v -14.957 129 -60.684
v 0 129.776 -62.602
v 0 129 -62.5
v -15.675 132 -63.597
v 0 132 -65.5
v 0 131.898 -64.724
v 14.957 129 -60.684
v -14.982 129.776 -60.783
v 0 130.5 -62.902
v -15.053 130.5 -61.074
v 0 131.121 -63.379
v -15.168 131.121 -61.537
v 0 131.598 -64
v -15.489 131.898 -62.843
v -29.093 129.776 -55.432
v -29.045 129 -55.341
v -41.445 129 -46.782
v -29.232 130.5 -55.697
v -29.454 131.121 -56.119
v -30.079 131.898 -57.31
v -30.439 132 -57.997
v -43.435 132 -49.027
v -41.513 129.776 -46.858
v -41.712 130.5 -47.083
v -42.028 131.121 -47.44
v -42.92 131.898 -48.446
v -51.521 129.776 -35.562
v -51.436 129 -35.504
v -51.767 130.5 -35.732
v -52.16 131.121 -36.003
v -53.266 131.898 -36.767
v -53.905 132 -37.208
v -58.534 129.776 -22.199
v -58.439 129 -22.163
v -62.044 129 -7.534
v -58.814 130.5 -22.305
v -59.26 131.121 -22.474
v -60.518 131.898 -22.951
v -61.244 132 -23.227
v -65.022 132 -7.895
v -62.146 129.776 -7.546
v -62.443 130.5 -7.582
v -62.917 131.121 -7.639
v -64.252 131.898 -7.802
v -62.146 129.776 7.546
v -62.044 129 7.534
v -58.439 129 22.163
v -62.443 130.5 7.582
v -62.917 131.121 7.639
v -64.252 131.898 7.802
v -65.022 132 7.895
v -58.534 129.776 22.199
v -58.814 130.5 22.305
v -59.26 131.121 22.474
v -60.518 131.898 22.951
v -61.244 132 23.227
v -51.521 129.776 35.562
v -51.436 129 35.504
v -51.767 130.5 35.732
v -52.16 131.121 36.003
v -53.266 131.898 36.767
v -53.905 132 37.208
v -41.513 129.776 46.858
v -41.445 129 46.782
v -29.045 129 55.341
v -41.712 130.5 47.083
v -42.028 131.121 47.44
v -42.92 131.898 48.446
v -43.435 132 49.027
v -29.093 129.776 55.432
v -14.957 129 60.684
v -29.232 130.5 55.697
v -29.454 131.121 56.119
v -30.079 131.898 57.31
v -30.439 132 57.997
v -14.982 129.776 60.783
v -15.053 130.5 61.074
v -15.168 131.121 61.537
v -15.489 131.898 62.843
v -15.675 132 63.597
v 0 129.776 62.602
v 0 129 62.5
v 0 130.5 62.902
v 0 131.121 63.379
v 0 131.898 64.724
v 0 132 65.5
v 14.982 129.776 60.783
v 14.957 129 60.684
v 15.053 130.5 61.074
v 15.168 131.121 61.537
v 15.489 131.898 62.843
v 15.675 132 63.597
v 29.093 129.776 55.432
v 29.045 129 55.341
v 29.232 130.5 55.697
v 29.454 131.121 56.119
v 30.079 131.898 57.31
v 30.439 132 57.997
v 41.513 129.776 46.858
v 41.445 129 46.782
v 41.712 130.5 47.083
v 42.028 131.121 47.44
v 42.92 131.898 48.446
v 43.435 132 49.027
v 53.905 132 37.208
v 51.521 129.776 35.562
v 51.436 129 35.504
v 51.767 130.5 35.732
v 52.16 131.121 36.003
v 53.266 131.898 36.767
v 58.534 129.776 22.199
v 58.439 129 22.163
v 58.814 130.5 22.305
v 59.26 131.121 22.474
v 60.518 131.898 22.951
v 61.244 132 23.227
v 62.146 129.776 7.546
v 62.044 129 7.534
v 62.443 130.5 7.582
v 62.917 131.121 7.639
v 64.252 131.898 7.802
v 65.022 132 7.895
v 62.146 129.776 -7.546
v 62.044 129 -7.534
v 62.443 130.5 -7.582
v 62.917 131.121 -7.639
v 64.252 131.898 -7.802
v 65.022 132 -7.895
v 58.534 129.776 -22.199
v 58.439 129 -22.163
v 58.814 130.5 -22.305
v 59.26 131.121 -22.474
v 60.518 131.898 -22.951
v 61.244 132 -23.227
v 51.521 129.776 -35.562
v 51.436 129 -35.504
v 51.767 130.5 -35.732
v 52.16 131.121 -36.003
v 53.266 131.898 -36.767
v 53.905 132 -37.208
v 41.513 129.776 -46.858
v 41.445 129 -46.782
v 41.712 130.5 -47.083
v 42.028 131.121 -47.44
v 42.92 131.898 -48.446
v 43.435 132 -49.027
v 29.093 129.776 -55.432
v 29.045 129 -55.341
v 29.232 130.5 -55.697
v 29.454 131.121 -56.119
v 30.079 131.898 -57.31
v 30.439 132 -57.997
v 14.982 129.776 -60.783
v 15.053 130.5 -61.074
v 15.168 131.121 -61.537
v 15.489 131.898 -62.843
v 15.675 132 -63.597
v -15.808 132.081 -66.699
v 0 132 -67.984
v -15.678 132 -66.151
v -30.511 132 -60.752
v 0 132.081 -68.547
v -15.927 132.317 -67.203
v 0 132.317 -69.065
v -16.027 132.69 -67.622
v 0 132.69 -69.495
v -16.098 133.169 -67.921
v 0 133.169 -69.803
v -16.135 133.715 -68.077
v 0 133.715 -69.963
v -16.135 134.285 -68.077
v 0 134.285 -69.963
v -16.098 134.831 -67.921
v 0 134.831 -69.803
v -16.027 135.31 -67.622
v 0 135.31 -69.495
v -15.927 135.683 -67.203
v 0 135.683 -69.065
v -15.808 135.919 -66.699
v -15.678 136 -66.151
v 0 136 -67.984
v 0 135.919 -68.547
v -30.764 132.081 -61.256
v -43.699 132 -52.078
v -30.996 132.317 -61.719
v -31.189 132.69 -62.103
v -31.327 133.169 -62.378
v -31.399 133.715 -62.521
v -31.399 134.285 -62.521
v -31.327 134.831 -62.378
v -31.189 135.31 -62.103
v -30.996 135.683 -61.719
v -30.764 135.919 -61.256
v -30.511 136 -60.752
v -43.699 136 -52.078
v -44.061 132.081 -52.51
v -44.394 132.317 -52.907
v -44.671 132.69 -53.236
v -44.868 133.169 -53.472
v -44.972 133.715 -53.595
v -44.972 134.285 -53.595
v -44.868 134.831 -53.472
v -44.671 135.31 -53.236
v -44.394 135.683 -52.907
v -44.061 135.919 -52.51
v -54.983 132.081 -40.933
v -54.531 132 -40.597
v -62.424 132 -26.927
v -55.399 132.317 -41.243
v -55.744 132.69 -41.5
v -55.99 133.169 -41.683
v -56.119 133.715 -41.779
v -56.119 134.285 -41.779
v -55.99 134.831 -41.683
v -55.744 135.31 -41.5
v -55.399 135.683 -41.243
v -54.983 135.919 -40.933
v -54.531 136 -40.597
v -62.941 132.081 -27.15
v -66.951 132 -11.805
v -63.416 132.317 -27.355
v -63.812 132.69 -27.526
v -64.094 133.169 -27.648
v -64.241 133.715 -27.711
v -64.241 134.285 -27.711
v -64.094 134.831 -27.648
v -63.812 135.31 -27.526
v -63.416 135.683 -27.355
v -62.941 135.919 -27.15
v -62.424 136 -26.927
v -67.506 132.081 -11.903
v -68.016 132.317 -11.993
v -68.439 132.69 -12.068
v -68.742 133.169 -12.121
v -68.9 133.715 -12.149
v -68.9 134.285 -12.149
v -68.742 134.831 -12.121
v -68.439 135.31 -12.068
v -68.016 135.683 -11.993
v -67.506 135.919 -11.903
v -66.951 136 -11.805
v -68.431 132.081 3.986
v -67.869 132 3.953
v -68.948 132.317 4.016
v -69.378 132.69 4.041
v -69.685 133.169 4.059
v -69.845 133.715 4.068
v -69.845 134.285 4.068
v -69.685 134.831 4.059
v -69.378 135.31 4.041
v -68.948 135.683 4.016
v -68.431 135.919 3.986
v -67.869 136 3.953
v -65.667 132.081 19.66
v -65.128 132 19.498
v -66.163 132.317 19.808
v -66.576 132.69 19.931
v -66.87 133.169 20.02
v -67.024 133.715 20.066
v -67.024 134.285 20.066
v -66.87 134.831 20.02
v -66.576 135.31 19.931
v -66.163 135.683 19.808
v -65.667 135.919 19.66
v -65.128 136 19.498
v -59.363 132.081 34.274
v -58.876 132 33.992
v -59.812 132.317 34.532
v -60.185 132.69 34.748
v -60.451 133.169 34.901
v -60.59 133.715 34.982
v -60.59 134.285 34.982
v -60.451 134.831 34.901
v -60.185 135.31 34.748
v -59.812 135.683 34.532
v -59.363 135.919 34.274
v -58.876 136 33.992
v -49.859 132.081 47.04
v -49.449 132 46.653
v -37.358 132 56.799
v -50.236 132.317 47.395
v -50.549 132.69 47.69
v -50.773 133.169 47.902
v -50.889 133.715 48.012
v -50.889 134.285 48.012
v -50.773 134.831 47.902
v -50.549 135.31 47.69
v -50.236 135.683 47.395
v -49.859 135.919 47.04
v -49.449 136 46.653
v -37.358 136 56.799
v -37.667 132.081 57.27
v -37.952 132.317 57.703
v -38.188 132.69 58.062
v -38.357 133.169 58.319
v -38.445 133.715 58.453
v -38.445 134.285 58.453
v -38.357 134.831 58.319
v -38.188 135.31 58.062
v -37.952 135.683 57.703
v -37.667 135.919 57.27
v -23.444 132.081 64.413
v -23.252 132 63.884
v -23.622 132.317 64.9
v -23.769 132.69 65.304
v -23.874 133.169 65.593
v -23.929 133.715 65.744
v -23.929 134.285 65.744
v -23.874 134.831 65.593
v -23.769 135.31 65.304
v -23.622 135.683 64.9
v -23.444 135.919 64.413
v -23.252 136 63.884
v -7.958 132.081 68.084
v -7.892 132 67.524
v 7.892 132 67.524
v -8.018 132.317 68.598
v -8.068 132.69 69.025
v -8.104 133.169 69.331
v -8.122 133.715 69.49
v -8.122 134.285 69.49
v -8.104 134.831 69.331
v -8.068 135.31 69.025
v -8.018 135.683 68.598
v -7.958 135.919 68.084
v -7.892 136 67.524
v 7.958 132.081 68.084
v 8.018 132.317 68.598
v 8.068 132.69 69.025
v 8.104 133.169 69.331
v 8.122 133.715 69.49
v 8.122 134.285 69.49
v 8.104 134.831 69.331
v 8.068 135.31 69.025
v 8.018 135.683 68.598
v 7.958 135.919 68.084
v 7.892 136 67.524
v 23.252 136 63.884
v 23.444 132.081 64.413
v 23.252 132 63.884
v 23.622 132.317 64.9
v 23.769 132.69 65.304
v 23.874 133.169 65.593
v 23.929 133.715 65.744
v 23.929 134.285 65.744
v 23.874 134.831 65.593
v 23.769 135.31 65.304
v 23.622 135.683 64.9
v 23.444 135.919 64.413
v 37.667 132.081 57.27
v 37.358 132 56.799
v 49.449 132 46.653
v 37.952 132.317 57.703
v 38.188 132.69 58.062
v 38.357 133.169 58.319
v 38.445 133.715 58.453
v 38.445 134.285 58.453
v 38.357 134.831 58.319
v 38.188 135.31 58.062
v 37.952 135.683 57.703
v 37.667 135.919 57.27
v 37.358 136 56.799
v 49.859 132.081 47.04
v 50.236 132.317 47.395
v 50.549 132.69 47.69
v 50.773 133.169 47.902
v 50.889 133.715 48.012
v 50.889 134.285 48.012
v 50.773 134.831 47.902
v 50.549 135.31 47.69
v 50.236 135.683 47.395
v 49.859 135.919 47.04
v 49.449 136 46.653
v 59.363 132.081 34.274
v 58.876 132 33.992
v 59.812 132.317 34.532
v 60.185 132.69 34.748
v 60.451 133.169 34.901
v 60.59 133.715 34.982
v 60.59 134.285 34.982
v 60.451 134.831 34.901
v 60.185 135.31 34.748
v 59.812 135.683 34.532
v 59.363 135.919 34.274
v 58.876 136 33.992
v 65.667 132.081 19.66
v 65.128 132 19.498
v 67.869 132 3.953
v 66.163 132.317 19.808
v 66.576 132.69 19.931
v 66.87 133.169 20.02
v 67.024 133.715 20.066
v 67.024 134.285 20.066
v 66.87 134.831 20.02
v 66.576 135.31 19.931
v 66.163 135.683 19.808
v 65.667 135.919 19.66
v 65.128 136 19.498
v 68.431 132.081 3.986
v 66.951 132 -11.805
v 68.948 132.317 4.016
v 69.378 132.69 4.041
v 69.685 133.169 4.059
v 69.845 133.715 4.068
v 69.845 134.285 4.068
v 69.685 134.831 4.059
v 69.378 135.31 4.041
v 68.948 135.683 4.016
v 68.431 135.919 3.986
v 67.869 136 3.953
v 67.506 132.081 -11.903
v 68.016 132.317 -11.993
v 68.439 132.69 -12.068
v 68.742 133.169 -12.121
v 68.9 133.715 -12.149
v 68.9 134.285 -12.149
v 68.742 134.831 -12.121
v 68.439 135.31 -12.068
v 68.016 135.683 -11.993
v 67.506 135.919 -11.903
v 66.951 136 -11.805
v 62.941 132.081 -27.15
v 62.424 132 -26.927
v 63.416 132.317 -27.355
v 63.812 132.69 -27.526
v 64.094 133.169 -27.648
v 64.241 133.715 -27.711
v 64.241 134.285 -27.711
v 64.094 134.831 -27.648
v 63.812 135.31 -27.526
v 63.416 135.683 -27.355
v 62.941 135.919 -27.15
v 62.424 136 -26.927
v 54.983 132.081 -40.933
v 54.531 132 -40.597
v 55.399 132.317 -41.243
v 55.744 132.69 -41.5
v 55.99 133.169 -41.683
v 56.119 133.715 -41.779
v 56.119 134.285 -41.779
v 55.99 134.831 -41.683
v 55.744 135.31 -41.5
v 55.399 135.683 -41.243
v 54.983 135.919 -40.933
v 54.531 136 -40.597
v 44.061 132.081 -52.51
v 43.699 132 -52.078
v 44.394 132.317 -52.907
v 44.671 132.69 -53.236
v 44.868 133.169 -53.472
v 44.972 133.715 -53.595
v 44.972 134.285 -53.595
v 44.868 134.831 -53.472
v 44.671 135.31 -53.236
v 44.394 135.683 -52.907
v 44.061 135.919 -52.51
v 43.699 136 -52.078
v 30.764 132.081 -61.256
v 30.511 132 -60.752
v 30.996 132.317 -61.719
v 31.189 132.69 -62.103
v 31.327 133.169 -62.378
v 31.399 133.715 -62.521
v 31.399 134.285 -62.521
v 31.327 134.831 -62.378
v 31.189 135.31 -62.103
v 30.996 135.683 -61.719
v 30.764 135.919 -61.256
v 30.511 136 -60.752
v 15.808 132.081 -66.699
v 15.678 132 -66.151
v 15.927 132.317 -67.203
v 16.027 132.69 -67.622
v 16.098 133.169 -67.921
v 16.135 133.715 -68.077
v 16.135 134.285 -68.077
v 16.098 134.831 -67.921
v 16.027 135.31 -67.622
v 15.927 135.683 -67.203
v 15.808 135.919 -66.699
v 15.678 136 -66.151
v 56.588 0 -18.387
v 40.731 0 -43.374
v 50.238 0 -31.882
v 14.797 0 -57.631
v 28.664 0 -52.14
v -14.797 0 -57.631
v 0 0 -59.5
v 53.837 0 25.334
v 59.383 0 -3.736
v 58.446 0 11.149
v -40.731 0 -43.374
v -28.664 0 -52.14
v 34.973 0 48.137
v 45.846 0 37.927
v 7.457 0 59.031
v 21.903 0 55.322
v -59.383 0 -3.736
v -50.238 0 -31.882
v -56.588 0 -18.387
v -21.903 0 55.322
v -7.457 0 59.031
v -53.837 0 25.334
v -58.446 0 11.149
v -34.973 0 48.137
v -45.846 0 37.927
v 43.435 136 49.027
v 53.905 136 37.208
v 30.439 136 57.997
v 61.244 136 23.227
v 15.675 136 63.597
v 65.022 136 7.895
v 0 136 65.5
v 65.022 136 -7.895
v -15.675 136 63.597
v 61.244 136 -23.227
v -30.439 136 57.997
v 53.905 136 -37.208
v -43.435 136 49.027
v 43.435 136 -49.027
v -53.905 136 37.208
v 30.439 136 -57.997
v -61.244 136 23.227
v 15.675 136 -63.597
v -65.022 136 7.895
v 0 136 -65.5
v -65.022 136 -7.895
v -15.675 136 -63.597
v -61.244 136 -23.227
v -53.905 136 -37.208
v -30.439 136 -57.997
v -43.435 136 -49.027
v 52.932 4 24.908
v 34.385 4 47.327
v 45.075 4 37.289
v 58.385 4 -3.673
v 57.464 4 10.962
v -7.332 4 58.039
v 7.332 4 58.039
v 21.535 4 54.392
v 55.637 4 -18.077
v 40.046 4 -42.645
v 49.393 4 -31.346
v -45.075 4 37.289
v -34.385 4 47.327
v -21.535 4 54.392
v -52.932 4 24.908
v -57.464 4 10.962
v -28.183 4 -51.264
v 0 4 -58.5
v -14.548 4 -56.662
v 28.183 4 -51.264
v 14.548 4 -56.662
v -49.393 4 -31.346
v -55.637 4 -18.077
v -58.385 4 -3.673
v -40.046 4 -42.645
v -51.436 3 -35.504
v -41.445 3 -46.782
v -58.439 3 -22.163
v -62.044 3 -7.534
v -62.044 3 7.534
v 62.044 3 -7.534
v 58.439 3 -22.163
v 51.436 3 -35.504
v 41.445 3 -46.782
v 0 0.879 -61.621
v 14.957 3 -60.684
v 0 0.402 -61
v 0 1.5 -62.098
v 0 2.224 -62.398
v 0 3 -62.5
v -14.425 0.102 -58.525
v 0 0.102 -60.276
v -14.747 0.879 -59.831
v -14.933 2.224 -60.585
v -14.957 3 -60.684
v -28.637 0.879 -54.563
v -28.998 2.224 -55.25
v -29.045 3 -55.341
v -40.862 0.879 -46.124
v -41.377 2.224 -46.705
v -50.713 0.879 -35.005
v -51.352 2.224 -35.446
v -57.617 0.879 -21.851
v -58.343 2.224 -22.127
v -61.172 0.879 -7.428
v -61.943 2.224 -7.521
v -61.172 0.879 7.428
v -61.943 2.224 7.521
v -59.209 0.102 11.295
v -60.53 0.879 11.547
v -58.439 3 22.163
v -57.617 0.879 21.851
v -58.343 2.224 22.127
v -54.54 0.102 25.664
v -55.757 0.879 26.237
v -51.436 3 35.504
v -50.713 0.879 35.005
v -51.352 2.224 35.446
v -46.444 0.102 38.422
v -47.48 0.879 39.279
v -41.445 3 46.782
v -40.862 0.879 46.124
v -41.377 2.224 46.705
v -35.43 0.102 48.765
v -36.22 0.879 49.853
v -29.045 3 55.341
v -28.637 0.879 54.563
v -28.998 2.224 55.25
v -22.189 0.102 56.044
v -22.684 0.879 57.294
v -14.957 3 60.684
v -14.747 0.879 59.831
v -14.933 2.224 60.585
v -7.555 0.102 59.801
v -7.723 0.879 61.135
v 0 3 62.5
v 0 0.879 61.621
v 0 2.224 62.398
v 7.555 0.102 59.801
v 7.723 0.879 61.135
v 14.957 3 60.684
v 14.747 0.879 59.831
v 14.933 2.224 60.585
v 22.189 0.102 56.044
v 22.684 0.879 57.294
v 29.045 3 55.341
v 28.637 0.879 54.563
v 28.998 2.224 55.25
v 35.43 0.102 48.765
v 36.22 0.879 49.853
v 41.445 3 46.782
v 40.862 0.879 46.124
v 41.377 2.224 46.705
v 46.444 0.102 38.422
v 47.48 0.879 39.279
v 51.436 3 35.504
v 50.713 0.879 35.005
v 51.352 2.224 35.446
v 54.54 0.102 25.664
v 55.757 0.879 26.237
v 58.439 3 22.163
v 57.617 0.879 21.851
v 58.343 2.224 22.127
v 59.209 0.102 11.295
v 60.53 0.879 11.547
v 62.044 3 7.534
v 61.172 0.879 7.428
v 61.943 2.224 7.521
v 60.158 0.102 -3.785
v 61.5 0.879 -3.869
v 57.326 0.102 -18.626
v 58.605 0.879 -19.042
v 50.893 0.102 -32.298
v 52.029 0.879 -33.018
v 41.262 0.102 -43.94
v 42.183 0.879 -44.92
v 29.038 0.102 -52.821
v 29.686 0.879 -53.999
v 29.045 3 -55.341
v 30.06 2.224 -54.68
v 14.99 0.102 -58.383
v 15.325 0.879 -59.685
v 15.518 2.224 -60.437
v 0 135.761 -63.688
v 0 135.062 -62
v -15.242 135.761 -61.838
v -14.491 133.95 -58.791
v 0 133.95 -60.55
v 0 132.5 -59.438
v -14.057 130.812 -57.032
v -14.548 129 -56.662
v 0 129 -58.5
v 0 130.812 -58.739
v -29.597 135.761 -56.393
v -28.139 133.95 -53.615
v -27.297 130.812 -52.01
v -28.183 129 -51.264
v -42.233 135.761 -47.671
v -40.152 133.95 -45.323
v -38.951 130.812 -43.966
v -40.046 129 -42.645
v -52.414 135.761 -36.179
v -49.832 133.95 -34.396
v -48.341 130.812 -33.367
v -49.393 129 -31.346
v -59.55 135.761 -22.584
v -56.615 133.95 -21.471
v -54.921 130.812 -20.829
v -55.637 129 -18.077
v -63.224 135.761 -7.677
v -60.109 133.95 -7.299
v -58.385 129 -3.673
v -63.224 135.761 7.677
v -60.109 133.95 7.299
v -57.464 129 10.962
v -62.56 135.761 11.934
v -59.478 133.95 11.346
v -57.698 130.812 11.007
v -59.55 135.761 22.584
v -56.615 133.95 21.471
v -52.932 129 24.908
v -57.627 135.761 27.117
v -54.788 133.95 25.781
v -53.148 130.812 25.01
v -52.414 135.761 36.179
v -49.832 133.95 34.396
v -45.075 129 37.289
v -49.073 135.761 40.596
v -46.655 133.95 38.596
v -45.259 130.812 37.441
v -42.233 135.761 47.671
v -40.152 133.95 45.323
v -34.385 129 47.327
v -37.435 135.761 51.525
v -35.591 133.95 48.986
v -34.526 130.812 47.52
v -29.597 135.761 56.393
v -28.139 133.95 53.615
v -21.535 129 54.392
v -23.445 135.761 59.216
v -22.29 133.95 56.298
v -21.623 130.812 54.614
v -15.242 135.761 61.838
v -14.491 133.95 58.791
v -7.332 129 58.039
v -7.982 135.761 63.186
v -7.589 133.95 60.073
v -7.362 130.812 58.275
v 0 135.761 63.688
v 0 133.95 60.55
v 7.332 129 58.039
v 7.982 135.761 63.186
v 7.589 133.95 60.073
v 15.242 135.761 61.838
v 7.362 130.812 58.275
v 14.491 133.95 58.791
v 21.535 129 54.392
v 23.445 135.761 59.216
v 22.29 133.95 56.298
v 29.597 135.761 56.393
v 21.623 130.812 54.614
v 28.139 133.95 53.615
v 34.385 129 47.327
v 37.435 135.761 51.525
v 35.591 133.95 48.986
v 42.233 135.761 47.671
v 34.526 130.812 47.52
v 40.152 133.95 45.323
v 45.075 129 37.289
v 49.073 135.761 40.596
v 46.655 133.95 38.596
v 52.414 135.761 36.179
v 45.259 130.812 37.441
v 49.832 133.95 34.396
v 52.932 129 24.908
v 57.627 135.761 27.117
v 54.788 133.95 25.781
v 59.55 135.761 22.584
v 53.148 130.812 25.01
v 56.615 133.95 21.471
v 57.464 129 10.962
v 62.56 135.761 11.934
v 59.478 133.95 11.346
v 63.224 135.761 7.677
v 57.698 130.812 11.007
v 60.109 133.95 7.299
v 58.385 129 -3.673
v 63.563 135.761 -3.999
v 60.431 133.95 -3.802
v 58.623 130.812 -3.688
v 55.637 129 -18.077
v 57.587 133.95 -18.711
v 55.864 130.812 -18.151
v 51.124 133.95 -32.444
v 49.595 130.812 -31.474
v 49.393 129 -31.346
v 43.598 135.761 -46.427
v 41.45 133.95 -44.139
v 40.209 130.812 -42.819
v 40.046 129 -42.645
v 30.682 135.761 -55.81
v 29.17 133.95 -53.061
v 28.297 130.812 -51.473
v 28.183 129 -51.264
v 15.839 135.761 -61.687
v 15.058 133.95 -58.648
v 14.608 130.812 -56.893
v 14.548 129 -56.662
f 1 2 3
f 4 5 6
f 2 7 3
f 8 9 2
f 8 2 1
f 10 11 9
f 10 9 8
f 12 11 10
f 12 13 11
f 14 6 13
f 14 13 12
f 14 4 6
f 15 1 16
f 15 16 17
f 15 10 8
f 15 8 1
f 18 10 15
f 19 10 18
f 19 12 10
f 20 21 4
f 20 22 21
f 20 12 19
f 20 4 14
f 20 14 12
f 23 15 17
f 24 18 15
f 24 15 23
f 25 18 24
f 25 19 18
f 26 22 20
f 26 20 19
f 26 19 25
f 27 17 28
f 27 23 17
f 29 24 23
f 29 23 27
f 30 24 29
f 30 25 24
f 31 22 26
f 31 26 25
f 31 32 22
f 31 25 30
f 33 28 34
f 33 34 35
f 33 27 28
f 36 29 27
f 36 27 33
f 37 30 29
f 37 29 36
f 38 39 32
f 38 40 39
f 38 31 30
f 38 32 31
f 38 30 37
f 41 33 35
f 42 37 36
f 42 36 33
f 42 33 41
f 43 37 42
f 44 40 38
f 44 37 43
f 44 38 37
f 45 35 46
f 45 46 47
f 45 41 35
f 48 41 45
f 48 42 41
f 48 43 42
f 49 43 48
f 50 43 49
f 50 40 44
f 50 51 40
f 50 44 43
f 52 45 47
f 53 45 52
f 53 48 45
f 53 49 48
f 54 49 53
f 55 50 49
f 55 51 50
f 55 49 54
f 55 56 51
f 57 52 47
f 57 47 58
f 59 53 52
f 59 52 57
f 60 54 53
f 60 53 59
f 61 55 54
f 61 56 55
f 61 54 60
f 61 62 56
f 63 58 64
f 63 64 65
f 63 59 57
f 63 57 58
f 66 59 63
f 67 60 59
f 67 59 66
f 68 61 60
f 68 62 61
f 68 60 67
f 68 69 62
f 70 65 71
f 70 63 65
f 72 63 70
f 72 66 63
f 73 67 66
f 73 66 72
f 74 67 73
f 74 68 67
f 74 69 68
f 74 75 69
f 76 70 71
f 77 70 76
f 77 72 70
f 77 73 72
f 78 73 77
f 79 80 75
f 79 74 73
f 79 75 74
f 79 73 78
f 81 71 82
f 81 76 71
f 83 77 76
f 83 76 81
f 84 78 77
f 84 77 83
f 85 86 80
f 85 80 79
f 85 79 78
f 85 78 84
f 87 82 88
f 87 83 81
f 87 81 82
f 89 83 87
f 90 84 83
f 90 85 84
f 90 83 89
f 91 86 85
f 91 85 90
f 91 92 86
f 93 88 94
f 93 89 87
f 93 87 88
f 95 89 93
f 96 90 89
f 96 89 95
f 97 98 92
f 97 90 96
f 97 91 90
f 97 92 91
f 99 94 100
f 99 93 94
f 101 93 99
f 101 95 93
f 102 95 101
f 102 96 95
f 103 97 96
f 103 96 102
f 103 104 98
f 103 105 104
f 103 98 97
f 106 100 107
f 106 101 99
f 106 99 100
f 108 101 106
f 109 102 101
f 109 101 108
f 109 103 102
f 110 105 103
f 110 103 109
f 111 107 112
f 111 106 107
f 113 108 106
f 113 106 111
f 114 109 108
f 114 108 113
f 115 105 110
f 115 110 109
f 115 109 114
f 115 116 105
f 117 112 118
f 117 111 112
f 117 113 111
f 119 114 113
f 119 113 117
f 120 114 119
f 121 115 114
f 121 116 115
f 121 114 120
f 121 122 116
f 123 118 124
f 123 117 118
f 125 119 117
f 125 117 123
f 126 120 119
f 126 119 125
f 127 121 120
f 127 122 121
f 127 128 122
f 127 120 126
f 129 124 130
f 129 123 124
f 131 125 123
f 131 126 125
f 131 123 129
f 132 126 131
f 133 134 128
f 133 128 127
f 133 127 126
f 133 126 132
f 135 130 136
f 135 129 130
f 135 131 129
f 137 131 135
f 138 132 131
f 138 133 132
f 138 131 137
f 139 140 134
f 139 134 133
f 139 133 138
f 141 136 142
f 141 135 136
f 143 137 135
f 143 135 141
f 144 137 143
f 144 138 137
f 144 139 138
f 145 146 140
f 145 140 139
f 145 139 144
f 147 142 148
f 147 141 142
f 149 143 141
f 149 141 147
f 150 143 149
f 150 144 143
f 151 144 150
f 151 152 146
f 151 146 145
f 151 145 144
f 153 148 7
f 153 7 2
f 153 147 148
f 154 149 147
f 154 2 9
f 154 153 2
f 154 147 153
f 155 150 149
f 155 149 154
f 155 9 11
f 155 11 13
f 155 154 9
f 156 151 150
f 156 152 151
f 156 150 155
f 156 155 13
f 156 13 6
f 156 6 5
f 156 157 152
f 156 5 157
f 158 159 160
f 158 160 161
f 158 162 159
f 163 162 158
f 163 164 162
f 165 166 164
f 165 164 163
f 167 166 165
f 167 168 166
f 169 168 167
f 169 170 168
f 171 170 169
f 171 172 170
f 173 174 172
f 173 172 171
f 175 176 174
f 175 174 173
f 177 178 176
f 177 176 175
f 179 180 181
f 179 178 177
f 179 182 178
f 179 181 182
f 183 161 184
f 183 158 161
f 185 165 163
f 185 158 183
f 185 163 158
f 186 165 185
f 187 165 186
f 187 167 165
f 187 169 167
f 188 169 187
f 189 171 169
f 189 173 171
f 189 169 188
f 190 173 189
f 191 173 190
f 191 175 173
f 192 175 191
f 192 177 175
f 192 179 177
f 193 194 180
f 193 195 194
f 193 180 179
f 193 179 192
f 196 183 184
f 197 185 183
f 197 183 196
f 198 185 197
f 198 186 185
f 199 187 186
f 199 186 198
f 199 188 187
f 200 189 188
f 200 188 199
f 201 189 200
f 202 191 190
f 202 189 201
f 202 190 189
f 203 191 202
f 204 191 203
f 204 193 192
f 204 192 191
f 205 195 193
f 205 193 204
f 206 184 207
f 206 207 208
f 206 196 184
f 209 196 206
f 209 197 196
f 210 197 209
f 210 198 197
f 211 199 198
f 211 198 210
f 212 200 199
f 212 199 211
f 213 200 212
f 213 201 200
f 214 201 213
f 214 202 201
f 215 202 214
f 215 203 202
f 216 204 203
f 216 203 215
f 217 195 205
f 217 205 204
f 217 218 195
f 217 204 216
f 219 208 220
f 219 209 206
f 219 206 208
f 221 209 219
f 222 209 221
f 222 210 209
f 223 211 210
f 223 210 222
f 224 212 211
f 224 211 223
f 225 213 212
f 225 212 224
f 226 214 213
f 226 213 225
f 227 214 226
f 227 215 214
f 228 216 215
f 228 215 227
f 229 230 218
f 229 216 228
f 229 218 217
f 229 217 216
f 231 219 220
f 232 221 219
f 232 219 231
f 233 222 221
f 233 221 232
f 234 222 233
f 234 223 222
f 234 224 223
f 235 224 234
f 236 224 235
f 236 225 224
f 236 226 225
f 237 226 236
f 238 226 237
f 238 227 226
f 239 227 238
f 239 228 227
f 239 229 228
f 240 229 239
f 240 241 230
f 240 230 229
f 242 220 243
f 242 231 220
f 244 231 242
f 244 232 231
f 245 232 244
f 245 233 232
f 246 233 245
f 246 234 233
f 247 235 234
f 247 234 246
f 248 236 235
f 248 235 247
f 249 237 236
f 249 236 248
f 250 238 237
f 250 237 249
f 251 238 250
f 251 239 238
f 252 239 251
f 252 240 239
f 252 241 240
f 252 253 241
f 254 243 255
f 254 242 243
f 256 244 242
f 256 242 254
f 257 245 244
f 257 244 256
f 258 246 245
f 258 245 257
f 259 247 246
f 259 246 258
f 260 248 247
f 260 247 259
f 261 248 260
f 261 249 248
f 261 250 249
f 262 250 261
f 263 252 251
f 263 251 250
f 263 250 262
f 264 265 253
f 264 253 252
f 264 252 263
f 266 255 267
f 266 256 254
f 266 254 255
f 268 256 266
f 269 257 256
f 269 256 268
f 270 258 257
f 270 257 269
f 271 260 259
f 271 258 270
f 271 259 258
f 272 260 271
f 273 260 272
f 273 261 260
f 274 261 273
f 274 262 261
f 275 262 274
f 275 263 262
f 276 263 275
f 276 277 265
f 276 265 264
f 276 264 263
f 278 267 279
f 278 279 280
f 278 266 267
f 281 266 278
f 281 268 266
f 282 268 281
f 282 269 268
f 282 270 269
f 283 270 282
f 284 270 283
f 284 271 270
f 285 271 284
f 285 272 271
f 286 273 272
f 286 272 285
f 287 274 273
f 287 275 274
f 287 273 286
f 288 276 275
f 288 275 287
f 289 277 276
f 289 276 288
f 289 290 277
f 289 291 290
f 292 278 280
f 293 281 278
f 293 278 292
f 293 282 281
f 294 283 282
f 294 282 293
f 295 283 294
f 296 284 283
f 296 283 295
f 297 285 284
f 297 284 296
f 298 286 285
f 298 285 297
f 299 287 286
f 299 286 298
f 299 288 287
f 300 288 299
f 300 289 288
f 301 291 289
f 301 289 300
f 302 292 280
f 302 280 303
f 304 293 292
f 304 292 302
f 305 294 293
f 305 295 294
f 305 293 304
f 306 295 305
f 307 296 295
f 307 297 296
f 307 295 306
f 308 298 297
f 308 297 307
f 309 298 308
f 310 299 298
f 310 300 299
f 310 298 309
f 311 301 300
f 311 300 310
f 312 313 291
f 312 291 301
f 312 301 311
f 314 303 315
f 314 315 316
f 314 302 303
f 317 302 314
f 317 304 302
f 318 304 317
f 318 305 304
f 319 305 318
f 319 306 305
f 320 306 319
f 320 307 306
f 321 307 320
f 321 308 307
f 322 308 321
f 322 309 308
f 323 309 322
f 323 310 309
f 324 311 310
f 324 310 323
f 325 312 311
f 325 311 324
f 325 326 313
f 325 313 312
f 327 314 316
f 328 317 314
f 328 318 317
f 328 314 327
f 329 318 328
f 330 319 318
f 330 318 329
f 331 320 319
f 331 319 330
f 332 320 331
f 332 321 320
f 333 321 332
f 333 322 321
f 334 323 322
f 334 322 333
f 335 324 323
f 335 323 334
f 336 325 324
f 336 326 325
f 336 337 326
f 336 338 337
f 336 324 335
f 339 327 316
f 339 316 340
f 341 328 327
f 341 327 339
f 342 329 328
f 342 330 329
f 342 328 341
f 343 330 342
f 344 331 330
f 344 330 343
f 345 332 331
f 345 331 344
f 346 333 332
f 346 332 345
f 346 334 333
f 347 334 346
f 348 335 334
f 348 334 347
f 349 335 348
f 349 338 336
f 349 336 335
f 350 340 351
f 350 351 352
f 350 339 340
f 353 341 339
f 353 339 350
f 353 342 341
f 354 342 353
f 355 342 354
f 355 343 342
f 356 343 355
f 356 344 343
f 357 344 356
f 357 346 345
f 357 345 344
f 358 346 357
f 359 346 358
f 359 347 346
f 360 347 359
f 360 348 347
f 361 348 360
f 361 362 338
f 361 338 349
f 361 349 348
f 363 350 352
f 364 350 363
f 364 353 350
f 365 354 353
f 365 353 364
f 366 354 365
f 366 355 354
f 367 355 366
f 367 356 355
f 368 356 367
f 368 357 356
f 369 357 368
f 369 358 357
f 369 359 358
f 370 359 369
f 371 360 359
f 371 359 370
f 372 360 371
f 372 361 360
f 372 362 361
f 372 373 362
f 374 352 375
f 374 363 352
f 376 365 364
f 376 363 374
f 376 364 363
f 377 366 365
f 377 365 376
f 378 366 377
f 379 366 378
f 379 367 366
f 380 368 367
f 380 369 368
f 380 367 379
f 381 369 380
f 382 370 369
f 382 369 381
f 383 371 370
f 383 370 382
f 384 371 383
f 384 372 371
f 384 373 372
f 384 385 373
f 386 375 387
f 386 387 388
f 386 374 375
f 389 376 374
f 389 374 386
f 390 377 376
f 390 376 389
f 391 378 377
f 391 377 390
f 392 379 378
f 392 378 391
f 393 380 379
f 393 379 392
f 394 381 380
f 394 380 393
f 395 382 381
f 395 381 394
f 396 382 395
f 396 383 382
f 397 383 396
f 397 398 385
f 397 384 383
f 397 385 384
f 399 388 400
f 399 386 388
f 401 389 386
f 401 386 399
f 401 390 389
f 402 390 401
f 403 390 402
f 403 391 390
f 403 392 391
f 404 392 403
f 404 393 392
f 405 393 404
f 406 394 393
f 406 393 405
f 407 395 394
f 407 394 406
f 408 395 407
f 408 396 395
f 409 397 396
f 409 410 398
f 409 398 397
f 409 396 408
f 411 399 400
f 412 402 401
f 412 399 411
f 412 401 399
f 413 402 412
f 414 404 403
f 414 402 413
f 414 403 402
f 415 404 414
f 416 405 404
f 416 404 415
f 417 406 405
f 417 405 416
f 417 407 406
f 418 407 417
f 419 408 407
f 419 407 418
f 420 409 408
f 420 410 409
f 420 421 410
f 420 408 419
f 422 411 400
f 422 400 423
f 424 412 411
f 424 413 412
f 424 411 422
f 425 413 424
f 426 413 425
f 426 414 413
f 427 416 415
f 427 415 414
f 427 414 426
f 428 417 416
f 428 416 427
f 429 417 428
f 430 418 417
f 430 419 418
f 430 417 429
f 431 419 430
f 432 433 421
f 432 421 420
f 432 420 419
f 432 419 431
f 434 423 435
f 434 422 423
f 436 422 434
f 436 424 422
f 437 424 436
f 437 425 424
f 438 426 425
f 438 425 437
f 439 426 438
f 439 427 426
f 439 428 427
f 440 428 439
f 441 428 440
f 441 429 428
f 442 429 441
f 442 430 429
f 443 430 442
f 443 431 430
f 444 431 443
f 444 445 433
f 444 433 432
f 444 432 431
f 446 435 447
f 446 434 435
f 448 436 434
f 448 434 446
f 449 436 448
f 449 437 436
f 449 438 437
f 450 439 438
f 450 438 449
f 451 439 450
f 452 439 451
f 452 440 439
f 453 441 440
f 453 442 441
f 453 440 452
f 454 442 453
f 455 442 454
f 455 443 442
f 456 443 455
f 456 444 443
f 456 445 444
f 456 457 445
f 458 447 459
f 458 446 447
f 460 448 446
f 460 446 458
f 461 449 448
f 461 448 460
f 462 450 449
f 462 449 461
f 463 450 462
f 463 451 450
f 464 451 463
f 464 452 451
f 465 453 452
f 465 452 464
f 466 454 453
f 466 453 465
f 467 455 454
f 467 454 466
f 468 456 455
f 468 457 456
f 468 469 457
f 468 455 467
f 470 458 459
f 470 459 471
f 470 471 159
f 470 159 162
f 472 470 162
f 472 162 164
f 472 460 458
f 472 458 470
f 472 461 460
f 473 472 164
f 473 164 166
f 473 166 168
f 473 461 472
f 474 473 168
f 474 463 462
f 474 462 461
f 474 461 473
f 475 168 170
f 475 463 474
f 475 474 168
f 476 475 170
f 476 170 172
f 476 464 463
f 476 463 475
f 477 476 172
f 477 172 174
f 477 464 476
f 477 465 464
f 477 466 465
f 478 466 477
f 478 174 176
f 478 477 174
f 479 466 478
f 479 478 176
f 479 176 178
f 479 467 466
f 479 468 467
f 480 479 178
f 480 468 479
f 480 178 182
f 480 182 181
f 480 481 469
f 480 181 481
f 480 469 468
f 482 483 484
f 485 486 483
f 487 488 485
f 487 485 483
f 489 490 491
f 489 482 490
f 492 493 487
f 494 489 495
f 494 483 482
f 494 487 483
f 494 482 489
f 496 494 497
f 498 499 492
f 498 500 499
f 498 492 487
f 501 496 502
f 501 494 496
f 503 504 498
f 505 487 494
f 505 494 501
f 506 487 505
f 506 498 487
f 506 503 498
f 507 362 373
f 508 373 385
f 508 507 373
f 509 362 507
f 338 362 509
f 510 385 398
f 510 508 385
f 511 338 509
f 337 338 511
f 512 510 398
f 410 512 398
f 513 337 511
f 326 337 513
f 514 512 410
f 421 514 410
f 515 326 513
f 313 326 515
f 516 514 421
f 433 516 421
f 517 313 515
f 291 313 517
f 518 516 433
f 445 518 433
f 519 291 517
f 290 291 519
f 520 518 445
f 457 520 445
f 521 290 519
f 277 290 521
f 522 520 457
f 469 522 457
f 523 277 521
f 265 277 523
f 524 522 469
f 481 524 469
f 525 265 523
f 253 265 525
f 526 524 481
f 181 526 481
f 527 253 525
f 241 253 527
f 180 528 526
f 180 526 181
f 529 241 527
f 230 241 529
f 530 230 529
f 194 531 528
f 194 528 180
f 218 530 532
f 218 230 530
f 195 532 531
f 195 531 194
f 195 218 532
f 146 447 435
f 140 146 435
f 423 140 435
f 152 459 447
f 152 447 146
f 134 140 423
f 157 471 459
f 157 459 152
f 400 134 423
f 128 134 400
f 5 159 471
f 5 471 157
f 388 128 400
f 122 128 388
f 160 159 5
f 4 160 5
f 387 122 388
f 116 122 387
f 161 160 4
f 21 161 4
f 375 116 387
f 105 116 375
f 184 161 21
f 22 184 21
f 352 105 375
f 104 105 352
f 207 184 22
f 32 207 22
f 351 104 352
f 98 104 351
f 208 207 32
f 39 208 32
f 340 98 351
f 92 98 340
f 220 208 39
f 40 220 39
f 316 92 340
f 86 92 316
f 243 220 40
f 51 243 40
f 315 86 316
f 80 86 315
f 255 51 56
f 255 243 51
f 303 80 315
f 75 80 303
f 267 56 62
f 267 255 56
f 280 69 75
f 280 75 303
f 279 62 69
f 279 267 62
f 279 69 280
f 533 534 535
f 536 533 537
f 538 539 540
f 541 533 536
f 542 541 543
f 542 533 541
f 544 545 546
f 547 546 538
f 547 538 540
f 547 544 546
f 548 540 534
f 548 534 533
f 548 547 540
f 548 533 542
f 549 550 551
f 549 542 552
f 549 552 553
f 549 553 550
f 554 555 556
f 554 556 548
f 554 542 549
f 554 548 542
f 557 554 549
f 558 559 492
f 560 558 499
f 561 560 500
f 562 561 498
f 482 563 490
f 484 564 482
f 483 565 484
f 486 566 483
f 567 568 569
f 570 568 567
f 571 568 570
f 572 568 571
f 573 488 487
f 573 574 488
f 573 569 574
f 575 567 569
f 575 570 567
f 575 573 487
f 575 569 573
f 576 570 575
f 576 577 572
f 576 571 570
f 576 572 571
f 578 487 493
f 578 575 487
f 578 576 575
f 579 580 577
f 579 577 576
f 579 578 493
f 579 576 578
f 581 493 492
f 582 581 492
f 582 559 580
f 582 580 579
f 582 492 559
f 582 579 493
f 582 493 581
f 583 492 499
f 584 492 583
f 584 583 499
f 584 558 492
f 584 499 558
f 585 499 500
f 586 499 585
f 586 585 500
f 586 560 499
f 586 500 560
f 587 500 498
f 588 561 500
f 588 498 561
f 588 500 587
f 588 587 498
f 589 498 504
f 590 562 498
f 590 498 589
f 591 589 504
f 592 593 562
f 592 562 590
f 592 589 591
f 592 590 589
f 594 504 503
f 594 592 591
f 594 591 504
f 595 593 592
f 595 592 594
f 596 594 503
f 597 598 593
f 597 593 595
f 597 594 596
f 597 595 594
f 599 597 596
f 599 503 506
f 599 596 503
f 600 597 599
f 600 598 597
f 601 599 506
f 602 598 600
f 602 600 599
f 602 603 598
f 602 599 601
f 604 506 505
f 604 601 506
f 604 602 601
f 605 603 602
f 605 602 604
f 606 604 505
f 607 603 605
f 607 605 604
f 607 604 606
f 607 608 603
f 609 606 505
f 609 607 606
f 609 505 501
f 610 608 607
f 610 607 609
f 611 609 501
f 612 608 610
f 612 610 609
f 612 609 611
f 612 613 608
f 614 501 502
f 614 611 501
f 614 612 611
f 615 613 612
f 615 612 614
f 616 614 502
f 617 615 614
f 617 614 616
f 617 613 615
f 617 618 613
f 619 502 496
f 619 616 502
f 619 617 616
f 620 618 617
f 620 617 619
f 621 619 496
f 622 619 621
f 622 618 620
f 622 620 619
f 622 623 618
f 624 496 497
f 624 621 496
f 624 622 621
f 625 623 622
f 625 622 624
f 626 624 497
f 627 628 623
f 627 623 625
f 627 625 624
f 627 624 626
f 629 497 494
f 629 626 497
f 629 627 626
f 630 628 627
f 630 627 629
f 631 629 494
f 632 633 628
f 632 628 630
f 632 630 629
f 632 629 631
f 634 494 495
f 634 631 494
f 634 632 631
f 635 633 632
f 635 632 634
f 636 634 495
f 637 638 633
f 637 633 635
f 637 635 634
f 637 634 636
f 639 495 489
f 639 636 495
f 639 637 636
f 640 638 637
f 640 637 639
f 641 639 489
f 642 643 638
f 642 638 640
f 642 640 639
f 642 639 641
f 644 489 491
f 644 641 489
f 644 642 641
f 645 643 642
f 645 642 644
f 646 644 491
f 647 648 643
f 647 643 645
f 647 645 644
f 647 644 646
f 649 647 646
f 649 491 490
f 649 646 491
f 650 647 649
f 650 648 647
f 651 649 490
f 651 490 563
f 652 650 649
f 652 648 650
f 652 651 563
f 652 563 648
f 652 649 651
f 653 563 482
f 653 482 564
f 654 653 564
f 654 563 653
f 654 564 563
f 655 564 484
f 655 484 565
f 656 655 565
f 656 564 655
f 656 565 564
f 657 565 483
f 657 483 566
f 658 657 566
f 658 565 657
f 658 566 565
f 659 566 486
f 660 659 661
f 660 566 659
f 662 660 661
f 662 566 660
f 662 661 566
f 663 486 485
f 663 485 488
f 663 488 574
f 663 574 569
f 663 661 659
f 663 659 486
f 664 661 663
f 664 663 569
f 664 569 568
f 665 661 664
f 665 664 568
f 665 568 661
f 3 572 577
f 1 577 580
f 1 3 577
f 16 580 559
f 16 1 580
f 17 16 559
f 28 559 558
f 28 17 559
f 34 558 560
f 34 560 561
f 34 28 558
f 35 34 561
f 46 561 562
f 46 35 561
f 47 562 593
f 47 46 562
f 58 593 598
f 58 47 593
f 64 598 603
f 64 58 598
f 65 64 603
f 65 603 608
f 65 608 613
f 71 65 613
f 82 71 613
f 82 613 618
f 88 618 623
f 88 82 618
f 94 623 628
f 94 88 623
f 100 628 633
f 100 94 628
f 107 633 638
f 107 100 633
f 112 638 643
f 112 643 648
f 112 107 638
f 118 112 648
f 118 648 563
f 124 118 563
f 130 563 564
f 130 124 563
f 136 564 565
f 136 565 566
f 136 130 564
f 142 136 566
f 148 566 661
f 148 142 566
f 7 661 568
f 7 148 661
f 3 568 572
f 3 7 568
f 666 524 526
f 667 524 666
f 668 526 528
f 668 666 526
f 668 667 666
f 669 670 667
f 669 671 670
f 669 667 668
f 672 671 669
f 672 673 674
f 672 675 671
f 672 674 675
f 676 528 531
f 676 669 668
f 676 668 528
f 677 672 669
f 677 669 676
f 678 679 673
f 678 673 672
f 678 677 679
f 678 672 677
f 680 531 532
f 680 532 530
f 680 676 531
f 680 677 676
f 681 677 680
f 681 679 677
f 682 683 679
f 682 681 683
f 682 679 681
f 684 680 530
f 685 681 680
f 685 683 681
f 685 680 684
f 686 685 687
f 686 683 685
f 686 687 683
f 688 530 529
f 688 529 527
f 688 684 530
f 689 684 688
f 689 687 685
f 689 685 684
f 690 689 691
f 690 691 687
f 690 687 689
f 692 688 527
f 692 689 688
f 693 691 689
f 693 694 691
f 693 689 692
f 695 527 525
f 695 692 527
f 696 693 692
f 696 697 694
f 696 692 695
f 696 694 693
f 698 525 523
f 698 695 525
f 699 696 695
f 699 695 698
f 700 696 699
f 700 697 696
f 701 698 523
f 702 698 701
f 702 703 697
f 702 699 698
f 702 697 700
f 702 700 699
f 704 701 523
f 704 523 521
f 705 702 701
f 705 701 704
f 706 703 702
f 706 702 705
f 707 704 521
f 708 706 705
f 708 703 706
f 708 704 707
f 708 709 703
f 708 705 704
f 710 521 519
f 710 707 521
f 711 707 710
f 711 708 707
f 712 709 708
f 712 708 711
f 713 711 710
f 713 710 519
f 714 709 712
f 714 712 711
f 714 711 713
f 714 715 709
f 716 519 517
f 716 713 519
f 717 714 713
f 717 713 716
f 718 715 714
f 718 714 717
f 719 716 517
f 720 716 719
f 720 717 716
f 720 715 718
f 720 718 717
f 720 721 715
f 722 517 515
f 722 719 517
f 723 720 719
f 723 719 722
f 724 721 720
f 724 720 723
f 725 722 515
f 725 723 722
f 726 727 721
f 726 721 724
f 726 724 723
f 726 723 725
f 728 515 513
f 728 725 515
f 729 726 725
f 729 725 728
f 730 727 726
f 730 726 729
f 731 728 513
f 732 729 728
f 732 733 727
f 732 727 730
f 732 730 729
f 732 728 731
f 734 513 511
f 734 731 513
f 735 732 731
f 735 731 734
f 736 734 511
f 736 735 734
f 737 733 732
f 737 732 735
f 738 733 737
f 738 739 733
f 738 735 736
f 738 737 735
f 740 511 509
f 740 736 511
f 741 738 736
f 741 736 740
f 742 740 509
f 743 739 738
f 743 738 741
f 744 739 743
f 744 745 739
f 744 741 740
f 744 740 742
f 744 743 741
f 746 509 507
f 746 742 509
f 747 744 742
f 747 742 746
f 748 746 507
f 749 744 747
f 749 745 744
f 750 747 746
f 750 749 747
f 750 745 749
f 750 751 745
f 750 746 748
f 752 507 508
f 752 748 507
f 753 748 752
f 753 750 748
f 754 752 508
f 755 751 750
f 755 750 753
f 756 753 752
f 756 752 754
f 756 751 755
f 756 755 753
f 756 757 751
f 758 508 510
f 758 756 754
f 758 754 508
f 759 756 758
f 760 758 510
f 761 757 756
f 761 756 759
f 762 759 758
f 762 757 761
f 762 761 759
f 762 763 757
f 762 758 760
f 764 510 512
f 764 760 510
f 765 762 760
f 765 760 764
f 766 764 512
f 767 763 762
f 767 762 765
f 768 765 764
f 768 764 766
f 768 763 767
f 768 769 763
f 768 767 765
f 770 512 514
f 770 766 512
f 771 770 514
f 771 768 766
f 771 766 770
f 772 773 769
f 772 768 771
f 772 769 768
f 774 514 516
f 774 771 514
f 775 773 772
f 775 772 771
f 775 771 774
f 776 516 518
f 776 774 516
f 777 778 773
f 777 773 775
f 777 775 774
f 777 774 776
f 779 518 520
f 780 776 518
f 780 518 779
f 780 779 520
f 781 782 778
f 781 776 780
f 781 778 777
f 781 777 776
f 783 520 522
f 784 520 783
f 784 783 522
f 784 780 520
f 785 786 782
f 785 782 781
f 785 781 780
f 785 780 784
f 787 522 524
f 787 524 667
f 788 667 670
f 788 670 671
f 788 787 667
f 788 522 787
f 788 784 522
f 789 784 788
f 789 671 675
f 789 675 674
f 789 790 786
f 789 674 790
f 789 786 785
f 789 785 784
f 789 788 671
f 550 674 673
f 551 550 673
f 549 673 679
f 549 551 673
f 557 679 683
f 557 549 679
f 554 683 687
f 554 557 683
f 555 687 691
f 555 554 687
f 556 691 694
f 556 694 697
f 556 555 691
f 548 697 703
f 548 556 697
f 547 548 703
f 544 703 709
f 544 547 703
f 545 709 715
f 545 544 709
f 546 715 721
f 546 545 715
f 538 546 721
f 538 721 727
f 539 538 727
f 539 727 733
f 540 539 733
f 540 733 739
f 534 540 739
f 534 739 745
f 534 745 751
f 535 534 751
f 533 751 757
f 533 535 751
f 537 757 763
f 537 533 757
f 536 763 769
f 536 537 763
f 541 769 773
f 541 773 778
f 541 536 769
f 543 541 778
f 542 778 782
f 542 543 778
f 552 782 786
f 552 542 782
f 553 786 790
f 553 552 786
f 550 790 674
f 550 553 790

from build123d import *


with BuildPart() as part:
    # Sketch1 → Revolve1 (revolve)
    with BuildSketch(Plane.XY, mode=Mode.PRIVATE) as revolve1_sk:
        with BuildLine():
            Line((0, 0), (-59.5, 0))
            ThreePointArc((-59.5, 0), (-61.621320344, 0.878679656), (-62.5, 3))
            Line((-62.5, 3), (-62.5, 129))
            ThreePointArc((-62.5, 129), (-63.378679656, 131.121320344), (-65.5, 132))
            Line((-65.5, 132), (-67.983599332, 132))
            ThreePointArc((-67.983599332, 132), (-69.983599332, 134), (-67.983599332, 136))
            Line((-67.983599332, 136), (-65.5, 136))
            ThreePointArc((-65.5, 136), (-60.550252532, 133.949747468), (-58.5, 129))
            Line((-58.5, 129), (-58.5, 4))
            Line((-58.5, 4), (0, 4))
            Line((0, 4), (0, 0))
        make_face()
    revolve(revolve1_sk.sketch.rotate(Axis((0, 0, 0), (0, 1, 0)), 270), axis=Axis((0, 0, 0), (0, 1, 0)))


solid = part.part
